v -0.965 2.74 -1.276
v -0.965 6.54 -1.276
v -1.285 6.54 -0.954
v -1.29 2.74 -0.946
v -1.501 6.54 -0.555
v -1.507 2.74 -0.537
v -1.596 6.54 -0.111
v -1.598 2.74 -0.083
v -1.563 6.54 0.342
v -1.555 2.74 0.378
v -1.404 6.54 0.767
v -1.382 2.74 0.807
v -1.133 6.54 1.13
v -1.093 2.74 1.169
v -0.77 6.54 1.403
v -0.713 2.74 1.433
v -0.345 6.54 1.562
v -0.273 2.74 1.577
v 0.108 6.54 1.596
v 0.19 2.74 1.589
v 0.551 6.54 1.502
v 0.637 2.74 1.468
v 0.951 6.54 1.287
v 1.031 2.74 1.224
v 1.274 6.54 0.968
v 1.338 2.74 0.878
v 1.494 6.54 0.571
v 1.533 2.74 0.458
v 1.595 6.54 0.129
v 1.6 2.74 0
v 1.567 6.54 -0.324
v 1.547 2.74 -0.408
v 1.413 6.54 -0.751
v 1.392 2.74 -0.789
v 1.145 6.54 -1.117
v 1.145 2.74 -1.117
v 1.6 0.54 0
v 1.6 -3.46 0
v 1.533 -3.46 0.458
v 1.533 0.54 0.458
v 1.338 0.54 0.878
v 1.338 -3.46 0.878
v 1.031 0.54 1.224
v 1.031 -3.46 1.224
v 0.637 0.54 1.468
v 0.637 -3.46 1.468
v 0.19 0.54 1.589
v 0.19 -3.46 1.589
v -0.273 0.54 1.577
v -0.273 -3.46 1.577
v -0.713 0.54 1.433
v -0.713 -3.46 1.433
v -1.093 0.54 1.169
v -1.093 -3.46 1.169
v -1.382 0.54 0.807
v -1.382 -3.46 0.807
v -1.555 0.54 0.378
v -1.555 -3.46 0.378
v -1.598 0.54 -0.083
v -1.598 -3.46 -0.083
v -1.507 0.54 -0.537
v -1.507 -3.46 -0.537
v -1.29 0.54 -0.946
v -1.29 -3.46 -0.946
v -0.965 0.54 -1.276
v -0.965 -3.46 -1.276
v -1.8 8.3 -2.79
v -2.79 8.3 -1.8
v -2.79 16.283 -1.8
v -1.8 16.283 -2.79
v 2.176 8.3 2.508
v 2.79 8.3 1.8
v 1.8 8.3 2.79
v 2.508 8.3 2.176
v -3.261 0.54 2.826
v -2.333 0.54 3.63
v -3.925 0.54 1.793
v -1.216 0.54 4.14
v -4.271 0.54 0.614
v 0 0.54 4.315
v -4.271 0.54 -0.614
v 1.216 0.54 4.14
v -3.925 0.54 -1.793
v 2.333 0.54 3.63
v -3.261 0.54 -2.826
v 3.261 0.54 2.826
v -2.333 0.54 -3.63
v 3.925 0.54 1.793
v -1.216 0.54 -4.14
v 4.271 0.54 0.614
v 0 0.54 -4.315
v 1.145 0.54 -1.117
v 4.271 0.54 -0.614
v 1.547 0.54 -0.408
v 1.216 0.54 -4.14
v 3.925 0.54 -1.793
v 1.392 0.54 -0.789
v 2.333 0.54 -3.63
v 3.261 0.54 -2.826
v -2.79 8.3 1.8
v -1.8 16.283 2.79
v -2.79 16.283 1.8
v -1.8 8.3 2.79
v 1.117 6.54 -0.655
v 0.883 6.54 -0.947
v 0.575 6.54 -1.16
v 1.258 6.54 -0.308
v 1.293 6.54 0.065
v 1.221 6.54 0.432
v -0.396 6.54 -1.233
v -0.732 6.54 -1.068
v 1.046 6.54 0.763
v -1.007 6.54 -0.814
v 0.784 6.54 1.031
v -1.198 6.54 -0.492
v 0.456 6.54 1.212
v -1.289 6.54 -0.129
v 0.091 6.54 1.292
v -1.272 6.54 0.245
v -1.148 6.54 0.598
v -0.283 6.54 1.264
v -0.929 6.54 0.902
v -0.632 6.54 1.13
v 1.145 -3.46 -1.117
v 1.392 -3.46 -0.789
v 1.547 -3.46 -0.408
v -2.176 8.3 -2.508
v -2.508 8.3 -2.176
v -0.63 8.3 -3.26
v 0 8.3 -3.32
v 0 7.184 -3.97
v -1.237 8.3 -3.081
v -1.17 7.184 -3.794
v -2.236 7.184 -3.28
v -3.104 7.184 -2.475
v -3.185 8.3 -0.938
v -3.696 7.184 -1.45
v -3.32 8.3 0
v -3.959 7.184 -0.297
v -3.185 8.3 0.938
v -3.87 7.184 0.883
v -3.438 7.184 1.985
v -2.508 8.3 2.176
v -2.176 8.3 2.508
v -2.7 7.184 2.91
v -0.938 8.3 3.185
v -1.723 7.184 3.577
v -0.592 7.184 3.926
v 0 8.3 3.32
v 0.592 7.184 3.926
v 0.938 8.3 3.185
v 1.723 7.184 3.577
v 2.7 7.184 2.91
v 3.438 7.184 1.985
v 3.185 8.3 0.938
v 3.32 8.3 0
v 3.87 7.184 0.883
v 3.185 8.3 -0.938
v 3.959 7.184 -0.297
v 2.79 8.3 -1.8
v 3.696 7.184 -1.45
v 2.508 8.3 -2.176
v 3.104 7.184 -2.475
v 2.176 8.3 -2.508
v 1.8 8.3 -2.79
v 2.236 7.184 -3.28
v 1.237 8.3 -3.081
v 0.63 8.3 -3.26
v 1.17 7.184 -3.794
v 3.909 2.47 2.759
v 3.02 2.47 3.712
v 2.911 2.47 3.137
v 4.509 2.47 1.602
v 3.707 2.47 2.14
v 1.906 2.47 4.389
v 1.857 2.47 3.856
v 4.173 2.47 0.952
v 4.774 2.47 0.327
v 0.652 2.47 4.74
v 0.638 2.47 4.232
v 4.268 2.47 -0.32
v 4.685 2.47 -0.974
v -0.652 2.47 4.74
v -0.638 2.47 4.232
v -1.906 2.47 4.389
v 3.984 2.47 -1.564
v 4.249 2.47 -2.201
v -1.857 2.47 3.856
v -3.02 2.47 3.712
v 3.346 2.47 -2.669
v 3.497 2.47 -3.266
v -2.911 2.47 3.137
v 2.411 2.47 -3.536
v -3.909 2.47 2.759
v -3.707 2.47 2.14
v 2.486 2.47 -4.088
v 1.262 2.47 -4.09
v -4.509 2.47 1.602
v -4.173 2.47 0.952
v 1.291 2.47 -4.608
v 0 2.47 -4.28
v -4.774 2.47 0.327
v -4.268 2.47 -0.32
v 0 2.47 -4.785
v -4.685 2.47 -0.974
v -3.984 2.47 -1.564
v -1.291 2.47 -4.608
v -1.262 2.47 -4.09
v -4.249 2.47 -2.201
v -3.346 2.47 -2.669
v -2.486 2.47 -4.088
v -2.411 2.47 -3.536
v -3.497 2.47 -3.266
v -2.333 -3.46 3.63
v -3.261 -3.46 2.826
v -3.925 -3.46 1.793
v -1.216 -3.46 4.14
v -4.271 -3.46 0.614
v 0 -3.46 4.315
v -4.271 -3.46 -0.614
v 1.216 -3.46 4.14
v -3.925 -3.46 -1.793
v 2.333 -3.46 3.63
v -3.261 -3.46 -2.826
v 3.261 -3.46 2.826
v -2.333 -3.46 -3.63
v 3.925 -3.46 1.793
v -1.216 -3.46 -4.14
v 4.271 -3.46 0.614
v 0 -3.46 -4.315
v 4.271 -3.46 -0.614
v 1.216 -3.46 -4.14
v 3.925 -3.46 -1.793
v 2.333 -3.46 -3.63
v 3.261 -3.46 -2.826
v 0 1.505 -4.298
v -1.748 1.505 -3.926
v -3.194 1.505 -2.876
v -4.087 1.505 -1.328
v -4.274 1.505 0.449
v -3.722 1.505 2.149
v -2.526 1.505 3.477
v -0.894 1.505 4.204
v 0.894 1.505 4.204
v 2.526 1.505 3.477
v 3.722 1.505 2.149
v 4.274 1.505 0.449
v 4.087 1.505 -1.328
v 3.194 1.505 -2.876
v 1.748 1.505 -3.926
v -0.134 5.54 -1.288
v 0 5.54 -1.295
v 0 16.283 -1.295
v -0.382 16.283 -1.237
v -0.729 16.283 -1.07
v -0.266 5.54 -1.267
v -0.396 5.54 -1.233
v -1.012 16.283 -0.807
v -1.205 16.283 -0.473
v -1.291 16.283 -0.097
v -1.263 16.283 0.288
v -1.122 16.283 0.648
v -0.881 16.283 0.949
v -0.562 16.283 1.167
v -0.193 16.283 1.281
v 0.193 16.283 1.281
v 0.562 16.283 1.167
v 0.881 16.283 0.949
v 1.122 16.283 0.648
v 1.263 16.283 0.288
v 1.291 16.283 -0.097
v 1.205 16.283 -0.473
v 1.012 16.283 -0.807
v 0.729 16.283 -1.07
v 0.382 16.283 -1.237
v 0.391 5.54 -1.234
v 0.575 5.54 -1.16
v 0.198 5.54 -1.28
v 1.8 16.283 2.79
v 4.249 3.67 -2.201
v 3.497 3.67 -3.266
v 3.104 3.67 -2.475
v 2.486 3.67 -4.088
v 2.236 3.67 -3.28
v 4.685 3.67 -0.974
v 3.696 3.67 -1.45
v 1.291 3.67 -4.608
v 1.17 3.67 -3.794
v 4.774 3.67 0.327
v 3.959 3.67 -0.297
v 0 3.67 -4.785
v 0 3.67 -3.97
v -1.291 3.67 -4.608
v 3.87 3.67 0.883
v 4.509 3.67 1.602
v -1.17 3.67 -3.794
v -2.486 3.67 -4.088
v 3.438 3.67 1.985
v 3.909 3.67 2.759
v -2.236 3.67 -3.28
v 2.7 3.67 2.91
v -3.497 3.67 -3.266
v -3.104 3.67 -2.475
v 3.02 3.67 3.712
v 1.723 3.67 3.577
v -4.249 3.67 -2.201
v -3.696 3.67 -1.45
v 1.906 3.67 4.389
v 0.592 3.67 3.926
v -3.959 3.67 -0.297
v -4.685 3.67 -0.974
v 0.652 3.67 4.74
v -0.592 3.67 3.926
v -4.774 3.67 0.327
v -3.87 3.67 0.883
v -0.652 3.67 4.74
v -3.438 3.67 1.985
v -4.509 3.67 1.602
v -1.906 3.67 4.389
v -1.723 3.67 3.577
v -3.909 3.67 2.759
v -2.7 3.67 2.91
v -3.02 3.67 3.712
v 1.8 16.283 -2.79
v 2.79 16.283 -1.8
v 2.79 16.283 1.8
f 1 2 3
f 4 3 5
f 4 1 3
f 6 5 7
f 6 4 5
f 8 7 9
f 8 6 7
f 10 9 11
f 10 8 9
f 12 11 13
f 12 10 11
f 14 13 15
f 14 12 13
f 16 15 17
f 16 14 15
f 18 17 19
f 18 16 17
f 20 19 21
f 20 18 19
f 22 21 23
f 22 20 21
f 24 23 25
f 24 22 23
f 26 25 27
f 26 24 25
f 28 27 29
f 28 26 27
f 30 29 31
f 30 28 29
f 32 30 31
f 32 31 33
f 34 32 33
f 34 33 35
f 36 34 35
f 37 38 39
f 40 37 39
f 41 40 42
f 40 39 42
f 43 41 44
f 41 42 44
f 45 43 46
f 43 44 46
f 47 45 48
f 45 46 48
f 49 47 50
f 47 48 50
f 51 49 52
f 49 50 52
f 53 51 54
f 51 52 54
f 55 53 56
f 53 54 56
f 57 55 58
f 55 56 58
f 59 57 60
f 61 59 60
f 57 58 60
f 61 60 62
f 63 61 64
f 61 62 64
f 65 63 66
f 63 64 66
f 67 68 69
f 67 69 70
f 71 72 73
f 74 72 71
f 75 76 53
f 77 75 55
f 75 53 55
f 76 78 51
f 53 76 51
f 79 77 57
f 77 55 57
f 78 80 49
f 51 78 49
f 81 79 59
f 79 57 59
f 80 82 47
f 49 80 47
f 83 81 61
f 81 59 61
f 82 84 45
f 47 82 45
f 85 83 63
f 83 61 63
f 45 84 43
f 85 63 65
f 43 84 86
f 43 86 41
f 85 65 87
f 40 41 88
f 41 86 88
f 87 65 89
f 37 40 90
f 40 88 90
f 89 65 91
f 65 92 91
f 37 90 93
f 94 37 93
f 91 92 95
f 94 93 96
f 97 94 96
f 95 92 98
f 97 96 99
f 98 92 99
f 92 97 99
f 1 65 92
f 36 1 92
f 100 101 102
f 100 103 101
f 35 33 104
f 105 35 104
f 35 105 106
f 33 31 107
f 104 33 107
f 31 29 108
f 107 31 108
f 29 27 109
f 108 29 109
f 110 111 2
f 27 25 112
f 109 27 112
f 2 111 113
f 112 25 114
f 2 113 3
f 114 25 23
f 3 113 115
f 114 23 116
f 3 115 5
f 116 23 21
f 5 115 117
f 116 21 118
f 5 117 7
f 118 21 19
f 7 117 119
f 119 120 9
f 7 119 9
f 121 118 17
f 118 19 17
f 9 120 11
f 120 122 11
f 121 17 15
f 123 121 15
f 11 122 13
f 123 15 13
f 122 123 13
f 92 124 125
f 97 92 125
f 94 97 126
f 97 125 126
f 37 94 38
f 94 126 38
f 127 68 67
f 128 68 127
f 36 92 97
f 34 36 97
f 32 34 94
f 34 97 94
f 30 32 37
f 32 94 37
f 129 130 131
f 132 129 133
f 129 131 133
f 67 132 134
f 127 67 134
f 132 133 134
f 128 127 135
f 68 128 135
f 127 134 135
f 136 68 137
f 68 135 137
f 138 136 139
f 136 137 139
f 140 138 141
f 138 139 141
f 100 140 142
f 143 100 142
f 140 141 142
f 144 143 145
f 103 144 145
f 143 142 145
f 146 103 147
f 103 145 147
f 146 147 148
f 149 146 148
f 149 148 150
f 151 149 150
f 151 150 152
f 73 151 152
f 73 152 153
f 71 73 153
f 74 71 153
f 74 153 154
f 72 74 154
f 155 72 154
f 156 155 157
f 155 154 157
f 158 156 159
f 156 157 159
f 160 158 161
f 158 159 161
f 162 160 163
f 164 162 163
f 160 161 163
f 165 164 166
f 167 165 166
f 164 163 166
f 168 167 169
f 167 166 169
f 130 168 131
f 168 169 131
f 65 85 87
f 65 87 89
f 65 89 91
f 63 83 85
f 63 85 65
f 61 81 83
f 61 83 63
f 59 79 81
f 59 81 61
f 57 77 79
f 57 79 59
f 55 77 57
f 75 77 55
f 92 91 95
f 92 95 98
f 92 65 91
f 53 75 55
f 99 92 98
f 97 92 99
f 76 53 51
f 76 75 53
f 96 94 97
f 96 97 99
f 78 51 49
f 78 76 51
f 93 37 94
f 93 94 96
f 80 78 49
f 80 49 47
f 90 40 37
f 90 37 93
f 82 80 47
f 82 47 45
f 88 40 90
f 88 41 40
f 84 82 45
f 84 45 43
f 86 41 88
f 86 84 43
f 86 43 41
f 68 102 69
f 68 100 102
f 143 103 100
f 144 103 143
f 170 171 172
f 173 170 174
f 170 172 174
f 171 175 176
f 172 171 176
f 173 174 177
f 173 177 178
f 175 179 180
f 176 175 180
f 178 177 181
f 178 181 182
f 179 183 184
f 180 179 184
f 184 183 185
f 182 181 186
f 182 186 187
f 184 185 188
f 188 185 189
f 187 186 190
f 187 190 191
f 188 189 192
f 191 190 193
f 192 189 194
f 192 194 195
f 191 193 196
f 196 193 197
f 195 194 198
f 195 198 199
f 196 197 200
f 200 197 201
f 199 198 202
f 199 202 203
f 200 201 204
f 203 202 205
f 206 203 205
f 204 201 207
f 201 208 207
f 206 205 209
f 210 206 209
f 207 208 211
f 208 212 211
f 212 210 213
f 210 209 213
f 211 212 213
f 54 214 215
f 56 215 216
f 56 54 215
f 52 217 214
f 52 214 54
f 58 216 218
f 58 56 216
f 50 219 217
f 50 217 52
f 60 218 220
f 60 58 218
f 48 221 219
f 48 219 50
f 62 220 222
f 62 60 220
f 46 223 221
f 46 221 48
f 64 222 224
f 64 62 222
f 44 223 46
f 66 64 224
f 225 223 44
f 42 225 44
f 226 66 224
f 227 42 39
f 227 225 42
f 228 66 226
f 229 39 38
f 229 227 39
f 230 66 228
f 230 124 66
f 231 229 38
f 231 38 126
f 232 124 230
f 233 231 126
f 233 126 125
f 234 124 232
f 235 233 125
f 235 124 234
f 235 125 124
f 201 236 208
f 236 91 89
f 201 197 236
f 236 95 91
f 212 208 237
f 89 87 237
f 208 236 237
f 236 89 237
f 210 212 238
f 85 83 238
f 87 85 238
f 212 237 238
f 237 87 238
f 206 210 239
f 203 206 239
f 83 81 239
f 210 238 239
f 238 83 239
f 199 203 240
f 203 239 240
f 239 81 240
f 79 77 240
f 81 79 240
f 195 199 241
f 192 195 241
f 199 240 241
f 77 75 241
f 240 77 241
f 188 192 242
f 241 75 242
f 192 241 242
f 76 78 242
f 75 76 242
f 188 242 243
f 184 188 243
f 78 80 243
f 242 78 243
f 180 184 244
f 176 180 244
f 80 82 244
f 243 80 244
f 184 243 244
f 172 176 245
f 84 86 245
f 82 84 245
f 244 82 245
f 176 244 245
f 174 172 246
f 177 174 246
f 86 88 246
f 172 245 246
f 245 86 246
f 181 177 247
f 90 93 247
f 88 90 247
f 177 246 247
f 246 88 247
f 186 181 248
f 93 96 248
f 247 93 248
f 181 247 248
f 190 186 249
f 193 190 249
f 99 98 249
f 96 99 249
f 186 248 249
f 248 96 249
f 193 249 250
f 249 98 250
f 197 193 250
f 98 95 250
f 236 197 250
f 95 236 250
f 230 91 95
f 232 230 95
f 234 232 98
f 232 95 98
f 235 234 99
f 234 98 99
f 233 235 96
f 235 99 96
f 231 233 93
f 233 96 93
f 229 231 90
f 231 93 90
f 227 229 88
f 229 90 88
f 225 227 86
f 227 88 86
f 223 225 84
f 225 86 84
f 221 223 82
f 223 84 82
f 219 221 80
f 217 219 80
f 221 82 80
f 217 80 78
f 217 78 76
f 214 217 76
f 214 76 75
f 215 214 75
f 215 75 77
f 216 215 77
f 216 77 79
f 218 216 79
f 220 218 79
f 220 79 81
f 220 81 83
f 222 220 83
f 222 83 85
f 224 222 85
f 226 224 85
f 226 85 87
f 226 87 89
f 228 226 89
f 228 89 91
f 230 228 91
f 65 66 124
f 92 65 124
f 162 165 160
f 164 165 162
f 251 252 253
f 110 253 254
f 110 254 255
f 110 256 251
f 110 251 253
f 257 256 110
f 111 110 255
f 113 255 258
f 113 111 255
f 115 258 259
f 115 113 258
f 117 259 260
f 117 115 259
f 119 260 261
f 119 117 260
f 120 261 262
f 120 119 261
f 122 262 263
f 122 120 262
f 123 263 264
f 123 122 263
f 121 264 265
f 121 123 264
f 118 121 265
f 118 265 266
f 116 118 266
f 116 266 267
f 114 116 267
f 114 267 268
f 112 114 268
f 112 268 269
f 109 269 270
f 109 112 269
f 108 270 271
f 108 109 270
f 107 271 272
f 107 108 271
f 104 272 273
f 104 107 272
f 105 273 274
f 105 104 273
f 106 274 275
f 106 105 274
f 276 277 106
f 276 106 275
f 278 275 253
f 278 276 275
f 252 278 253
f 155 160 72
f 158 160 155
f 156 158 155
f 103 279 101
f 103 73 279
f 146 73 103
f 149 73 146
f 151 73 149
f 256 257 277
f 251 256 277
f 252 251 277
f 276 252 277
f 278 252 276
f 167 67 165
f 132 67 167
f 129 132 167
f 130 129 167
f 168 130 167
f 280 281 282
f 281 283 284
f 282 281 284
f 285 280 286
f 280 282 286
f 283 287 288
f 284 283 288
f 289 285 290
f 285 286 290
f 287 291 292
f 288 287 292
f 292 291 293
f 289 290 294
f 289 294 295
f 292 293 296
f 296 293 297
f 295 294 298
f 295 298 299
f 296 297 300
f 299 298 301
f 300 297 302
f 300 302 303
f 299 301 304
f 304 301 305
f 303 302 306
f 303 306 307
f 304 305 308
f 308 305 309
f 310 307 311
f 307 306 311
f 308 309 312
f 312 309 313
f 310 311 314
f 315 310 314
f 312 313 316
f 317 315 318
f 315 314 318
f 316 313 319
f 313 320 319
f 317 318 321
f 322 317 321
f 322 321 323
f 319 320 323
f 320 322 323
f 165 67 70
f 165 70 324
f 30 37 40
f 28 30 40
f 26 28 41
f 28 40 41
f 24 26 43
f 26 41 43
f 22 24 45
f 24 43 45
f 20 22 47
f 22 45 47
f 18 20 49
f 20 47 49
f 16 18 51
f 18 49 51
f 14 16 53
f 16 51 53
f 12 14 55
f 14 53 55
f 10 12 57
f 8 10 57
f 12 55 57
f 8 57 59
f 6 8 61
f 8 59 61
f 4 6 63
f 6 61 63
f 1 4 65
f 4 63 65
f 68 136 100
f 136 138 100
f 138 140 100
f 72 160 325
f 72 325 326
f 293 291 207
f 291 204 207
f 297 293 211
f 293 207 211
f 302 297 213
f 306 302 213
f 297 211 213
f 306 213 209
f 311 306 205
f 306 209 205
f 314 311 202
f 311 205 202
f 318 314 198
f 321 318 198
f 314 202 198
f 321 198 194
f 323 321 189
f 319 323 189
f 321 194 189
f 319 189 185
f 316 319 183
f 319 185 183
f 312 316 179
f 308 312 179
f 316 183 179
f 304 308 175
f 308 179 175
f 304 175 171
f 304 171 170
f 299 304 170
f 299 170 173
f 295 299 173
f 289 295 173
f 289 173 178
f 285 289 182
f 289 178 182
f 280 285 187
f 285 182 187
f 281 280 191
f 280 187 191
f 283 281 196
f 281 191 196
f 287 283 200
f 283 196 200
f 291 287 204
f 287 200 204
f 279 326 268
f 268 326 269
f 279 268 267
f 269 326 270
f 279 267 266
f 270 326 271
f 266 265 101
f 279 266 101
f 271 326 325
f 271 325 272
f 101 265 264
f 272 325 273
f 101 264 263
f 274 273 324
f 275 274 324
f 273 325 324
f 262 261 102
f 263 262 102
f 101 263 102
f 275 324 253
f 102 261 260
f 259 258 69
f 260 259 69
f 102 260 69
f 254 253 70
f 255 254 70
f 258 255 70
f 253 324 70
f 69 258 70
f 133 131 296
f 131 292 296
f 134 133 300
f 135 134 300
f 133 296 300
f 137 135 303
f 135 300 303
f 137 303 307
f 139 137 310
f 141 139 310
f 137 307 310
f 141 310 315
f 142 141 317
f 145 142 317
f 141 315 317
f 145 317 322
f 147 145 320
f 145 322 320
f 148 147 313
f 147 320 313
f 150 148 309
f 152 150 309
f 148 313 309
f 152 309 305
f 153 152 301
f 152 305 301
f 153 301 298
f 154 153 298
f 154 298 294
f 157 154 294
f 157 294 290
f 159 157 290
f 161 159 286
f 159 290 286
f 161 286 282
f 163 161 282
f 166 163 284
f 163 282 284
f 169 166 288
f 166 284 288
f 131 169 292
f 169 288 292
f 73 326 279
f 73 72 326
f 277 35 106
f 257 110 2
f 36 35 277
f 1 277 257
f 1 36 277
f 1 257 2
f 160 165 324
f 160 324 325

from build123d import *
from build123d.topology import SkipClean

# Parameters (mm, degrees)
SKETCH2_R                = 1.295
BOSS_EXTRUDE1_DEPTH      = 7.7
SKETCH3_R                = 2.7
BOSS_EXTRUDE4_DEPTH      = 6
SKETCH5_R                = 4.484484463
CUT_EXTRUDE1_DEPTH       = 1
SKETCH8_R                = 4.315
BOSS_EXTRUDE8_DEPTH      = 8
CUT_EXTRUDE4_DEPTH       = 10.2
SKETCH14_W               = 2.622578867
SKETCH14_H               = 4.71707074
CUT_EXTRUDE11_DEPTH      = 19.337852928
CUT_EXTRUDE11_DEPTH_BACK = 19.337852928
SKETCH16_R               = 1.295
BOSS_EXTRUDE9_DEPTH      = 5
CUT_EXTRUDE12_DEPTH      = 14
SKETCH22_R               = 4.315
CUT_EXTRUDE14_DEPTH      = 4


with BuildPart() as part:
    # Sketch1 → Revolve1 (revolve)
    with BuildSketch(Plane.XY, mode=Mode.PRIVATE) as revolve1_sk:
        Polygon((-2.7, 0), (-2.7, 5.54), (-1.295, 5.54), (-1.295, 8.3), (-3.32, 8.3), (-3.97, 7.184383121), (-3.97, 3.67), (-4.785, 3.67), (-4.785, 2.47), (-4.28, 2.47), (-4.325, 0), align=None)
    revolve(revolve1_sk.sketch.rotate(Axis((0, 0, 0), (0, 1, 0)), 270), axis=Axis((0, 0, 0), (0, 1, 0)))

    # Sketch2 → Boss-Extrude1 (add)
    with BuildSketch(Plane(origin=(0, 8.3, 0), x_dir=(1, 0, 0), z_dir=(0, 1, 0))):
        Polygon((1.799527716, 2.79), (-1.799527716, 2.79), (-2.79, 1.799527716), (-2.79, -1.799527716), (-1.799527716, -2.79), (1.799527716, -2.79), (2.79, -1.799527716), (2.79, 1.799527716), align=None)
        with Locations(Location((0, 0, 0), (0, 0, 90))):
            Circle(SKETCH2_R, mode=Mode.SUBTRACT)
    extrude(amount=BOSS_EXTRUDE1_DEPTH)

    # Sketch3 → Boss-Extrude4 (add)
    with BuildSketch(Plane.XZ.offset(-5.54)):
        with Locations(Location((0, 0, 0), (0, 0, 270))):
            Circle(SKETCH3_R)
    extrude(amount=BOSS_EXTRUDE4_DEPTH)

    # Sketch5 → Cut-Extrude1 (cut)
    with BuildSketch(Plane.XZ.offset(0.46)):
        Circle(SKETCH5_R)
    extrude(amount=-CUT_EXTRUDE1_DEPTH, mode=Mode.SUBTRACT)


with BuildPart() as body_2:
    # Sketch8 → Boss-Extrude8 (new body)
    with BuildSketch(Plane.XZ.offset(-0.54)):
        with Locations(Location((0, 0, 0), (0, 0, 270))):
            Circle(SKETCH8_R)
    extrude(amount=BOSS_EXTRUDE8_DEPTH)


with BuildPart() as cut_extrude4_tool:
    # Sketch13 → Cut-Extrude4 (new body)
    with BuildSketch(Plane.XZ.offset(7.46)):
        with BuildLine():
            ThreePointArc((1.6, 0), (-0.71250829, 1.432596222), (-0.96541492, -1.275920857))
            Line((-0.96541492, -1.275920857), (1.145236615, -1.117333029))
            ThreePointArc((1.145236615, -1.117333029), (1.481954551, -0.603167231), (1.6, 0))
        make_face()
    extrude(amount=-CUT_EXTRUDE4_DEPTH)


with BuildPart() as part_1:
    add(part.part)

    # Cut-Extrude4: cut by cut_extrude4_tool
    add(cut_extrude4_tool.part, mode=Mode.SUBTRACT)

    # Sketch14 → Cut-Extrude11 (cut, two sides)
    with BuildSketch(Plane.ZY.offset(2.79)) as cut_extrude11_sk:
        Polygon((-1.799527716, 11.28292926), (1.799527716, 11.28292926), (1.799527716, 16), (-1.799527716, 16), (-1.799527716, 11.405412722), align=None)
        with Locations((3.11081715, 13.64146463)):
            Rectangle(SKETCH14_W, SKETCH14_H)
        Polygon((-3.994671482, 11.28292926), (-1.799527716, 11.28292926), (-1.799527716, 11.405412722), (-1.799527716, 16), (-3.994671482, 16), align=None)
    extrude(amount=CUT_EXTRUDE11_DEPTH, mode=Mode.SUBTRACT)
    extrude(cut_extrude11_sk.sketch, amount=-CUT_EXTRUDE11_DEPTH_BACK, mode=Mode.SUBTRACT)

    # Sketch16 → Boss-Extrude9 (add)
    with BuildSketch(Plane(origin=(0, 11.28292926, 0), x_dir=(1, 0, 0), z_dir=(0, 1, 0))):
        Polygon((-2.79, -1.799527716), (-2.79, 1.799527716), (-1.799527716, 2.79), (1.799527716, 2.79), (2.79, 1.799527716), (2.79, -1.799527716), (1.799527716, -2.79), (-1.799527716, -2.79), align=None)
        with Locations(Location((0, 0, 0), (0, 0, 90))):
            Circle(SKETCH16_R, mode=Mode.SUBTRACT)
    extrude(amount=BOSS_EXTRUDE9_DEPTH)

    # Sketch21 → Cut-Extrude12 (cut)
    with SkipClean():  # the faces are left unmerged after this step: merging them gives an invalid solid
        with BuildSketch(Plane.XZ.offset(7.46)):
            with BuildLine():
                Line((1.145236615, -1.117333029), (-0.96541492, -1.275920857))
                ThreePointArc((-0.96541492, -1.275920857), (-0.11988113, 1.59550259), (1.145236615, -1.117333029))
            make_face()
        extrude(amount=-CUT_EXTRUDE12_DEPTH, mode=Mode.SUBTRACT)


with BuildPart() as body_2_1:
    add(body_2.part)

    # Cut-Extrude4: cut by cut_extrude4_tool
    add(cut_extrude4_tool.part, mode=Mode.SUBTRACT)

    # Sketch22 → Cut-Extrude14 (cut)
    with BuildSketch(Plane.XZ.offset(7.46)):
        with Locations(Location((0, 0, 0), (0, 0, 270))):
            Circle(SKETCH22_R)
        with BuildLine():
            ThreePointArc((1.6, 0), (1.481954551, -0.603167231), (1.145236615, -1.117333029))
            ThreePointArc((1.145236615, -1.117333029), (0.11988113, -1.59550259), (-0.96541492, -1.275920857))
            ThreePointArc((-0.96541492, -1.275920857), (-0.71250829, 1.432596222), (1.6, 0))
        make_face(mode=Mode.SUBTRACT)
        with BuildLine():
            ThreePointArc((-0.96541492, -1.275920857), (0.11988113, -1.59550259), (1.145236615, -1.117333029))
            Line((1.145236615, -1.117333029), (-0.96541492, -1.275920857))
        make_face()
        with BuildLine():
            Line((-0.96541492, -1.275920857), (1.145236615, -1.117333029))
            ThreePointArc((1.145236615, -1.117333029), (1.481954551, -0.603167231), (1.6, 0))
            ThreePointArc((1.6, 0), (-0.71250829, 1.432596222), (-0.96541492, -1.275920857))
        make_face()
    extrude(amount=-CUT_EXTRUDE14_DEPTH, mode=Mode.SUBTRACT)


solid = Compound([part_1.part, body_2_1.part])
